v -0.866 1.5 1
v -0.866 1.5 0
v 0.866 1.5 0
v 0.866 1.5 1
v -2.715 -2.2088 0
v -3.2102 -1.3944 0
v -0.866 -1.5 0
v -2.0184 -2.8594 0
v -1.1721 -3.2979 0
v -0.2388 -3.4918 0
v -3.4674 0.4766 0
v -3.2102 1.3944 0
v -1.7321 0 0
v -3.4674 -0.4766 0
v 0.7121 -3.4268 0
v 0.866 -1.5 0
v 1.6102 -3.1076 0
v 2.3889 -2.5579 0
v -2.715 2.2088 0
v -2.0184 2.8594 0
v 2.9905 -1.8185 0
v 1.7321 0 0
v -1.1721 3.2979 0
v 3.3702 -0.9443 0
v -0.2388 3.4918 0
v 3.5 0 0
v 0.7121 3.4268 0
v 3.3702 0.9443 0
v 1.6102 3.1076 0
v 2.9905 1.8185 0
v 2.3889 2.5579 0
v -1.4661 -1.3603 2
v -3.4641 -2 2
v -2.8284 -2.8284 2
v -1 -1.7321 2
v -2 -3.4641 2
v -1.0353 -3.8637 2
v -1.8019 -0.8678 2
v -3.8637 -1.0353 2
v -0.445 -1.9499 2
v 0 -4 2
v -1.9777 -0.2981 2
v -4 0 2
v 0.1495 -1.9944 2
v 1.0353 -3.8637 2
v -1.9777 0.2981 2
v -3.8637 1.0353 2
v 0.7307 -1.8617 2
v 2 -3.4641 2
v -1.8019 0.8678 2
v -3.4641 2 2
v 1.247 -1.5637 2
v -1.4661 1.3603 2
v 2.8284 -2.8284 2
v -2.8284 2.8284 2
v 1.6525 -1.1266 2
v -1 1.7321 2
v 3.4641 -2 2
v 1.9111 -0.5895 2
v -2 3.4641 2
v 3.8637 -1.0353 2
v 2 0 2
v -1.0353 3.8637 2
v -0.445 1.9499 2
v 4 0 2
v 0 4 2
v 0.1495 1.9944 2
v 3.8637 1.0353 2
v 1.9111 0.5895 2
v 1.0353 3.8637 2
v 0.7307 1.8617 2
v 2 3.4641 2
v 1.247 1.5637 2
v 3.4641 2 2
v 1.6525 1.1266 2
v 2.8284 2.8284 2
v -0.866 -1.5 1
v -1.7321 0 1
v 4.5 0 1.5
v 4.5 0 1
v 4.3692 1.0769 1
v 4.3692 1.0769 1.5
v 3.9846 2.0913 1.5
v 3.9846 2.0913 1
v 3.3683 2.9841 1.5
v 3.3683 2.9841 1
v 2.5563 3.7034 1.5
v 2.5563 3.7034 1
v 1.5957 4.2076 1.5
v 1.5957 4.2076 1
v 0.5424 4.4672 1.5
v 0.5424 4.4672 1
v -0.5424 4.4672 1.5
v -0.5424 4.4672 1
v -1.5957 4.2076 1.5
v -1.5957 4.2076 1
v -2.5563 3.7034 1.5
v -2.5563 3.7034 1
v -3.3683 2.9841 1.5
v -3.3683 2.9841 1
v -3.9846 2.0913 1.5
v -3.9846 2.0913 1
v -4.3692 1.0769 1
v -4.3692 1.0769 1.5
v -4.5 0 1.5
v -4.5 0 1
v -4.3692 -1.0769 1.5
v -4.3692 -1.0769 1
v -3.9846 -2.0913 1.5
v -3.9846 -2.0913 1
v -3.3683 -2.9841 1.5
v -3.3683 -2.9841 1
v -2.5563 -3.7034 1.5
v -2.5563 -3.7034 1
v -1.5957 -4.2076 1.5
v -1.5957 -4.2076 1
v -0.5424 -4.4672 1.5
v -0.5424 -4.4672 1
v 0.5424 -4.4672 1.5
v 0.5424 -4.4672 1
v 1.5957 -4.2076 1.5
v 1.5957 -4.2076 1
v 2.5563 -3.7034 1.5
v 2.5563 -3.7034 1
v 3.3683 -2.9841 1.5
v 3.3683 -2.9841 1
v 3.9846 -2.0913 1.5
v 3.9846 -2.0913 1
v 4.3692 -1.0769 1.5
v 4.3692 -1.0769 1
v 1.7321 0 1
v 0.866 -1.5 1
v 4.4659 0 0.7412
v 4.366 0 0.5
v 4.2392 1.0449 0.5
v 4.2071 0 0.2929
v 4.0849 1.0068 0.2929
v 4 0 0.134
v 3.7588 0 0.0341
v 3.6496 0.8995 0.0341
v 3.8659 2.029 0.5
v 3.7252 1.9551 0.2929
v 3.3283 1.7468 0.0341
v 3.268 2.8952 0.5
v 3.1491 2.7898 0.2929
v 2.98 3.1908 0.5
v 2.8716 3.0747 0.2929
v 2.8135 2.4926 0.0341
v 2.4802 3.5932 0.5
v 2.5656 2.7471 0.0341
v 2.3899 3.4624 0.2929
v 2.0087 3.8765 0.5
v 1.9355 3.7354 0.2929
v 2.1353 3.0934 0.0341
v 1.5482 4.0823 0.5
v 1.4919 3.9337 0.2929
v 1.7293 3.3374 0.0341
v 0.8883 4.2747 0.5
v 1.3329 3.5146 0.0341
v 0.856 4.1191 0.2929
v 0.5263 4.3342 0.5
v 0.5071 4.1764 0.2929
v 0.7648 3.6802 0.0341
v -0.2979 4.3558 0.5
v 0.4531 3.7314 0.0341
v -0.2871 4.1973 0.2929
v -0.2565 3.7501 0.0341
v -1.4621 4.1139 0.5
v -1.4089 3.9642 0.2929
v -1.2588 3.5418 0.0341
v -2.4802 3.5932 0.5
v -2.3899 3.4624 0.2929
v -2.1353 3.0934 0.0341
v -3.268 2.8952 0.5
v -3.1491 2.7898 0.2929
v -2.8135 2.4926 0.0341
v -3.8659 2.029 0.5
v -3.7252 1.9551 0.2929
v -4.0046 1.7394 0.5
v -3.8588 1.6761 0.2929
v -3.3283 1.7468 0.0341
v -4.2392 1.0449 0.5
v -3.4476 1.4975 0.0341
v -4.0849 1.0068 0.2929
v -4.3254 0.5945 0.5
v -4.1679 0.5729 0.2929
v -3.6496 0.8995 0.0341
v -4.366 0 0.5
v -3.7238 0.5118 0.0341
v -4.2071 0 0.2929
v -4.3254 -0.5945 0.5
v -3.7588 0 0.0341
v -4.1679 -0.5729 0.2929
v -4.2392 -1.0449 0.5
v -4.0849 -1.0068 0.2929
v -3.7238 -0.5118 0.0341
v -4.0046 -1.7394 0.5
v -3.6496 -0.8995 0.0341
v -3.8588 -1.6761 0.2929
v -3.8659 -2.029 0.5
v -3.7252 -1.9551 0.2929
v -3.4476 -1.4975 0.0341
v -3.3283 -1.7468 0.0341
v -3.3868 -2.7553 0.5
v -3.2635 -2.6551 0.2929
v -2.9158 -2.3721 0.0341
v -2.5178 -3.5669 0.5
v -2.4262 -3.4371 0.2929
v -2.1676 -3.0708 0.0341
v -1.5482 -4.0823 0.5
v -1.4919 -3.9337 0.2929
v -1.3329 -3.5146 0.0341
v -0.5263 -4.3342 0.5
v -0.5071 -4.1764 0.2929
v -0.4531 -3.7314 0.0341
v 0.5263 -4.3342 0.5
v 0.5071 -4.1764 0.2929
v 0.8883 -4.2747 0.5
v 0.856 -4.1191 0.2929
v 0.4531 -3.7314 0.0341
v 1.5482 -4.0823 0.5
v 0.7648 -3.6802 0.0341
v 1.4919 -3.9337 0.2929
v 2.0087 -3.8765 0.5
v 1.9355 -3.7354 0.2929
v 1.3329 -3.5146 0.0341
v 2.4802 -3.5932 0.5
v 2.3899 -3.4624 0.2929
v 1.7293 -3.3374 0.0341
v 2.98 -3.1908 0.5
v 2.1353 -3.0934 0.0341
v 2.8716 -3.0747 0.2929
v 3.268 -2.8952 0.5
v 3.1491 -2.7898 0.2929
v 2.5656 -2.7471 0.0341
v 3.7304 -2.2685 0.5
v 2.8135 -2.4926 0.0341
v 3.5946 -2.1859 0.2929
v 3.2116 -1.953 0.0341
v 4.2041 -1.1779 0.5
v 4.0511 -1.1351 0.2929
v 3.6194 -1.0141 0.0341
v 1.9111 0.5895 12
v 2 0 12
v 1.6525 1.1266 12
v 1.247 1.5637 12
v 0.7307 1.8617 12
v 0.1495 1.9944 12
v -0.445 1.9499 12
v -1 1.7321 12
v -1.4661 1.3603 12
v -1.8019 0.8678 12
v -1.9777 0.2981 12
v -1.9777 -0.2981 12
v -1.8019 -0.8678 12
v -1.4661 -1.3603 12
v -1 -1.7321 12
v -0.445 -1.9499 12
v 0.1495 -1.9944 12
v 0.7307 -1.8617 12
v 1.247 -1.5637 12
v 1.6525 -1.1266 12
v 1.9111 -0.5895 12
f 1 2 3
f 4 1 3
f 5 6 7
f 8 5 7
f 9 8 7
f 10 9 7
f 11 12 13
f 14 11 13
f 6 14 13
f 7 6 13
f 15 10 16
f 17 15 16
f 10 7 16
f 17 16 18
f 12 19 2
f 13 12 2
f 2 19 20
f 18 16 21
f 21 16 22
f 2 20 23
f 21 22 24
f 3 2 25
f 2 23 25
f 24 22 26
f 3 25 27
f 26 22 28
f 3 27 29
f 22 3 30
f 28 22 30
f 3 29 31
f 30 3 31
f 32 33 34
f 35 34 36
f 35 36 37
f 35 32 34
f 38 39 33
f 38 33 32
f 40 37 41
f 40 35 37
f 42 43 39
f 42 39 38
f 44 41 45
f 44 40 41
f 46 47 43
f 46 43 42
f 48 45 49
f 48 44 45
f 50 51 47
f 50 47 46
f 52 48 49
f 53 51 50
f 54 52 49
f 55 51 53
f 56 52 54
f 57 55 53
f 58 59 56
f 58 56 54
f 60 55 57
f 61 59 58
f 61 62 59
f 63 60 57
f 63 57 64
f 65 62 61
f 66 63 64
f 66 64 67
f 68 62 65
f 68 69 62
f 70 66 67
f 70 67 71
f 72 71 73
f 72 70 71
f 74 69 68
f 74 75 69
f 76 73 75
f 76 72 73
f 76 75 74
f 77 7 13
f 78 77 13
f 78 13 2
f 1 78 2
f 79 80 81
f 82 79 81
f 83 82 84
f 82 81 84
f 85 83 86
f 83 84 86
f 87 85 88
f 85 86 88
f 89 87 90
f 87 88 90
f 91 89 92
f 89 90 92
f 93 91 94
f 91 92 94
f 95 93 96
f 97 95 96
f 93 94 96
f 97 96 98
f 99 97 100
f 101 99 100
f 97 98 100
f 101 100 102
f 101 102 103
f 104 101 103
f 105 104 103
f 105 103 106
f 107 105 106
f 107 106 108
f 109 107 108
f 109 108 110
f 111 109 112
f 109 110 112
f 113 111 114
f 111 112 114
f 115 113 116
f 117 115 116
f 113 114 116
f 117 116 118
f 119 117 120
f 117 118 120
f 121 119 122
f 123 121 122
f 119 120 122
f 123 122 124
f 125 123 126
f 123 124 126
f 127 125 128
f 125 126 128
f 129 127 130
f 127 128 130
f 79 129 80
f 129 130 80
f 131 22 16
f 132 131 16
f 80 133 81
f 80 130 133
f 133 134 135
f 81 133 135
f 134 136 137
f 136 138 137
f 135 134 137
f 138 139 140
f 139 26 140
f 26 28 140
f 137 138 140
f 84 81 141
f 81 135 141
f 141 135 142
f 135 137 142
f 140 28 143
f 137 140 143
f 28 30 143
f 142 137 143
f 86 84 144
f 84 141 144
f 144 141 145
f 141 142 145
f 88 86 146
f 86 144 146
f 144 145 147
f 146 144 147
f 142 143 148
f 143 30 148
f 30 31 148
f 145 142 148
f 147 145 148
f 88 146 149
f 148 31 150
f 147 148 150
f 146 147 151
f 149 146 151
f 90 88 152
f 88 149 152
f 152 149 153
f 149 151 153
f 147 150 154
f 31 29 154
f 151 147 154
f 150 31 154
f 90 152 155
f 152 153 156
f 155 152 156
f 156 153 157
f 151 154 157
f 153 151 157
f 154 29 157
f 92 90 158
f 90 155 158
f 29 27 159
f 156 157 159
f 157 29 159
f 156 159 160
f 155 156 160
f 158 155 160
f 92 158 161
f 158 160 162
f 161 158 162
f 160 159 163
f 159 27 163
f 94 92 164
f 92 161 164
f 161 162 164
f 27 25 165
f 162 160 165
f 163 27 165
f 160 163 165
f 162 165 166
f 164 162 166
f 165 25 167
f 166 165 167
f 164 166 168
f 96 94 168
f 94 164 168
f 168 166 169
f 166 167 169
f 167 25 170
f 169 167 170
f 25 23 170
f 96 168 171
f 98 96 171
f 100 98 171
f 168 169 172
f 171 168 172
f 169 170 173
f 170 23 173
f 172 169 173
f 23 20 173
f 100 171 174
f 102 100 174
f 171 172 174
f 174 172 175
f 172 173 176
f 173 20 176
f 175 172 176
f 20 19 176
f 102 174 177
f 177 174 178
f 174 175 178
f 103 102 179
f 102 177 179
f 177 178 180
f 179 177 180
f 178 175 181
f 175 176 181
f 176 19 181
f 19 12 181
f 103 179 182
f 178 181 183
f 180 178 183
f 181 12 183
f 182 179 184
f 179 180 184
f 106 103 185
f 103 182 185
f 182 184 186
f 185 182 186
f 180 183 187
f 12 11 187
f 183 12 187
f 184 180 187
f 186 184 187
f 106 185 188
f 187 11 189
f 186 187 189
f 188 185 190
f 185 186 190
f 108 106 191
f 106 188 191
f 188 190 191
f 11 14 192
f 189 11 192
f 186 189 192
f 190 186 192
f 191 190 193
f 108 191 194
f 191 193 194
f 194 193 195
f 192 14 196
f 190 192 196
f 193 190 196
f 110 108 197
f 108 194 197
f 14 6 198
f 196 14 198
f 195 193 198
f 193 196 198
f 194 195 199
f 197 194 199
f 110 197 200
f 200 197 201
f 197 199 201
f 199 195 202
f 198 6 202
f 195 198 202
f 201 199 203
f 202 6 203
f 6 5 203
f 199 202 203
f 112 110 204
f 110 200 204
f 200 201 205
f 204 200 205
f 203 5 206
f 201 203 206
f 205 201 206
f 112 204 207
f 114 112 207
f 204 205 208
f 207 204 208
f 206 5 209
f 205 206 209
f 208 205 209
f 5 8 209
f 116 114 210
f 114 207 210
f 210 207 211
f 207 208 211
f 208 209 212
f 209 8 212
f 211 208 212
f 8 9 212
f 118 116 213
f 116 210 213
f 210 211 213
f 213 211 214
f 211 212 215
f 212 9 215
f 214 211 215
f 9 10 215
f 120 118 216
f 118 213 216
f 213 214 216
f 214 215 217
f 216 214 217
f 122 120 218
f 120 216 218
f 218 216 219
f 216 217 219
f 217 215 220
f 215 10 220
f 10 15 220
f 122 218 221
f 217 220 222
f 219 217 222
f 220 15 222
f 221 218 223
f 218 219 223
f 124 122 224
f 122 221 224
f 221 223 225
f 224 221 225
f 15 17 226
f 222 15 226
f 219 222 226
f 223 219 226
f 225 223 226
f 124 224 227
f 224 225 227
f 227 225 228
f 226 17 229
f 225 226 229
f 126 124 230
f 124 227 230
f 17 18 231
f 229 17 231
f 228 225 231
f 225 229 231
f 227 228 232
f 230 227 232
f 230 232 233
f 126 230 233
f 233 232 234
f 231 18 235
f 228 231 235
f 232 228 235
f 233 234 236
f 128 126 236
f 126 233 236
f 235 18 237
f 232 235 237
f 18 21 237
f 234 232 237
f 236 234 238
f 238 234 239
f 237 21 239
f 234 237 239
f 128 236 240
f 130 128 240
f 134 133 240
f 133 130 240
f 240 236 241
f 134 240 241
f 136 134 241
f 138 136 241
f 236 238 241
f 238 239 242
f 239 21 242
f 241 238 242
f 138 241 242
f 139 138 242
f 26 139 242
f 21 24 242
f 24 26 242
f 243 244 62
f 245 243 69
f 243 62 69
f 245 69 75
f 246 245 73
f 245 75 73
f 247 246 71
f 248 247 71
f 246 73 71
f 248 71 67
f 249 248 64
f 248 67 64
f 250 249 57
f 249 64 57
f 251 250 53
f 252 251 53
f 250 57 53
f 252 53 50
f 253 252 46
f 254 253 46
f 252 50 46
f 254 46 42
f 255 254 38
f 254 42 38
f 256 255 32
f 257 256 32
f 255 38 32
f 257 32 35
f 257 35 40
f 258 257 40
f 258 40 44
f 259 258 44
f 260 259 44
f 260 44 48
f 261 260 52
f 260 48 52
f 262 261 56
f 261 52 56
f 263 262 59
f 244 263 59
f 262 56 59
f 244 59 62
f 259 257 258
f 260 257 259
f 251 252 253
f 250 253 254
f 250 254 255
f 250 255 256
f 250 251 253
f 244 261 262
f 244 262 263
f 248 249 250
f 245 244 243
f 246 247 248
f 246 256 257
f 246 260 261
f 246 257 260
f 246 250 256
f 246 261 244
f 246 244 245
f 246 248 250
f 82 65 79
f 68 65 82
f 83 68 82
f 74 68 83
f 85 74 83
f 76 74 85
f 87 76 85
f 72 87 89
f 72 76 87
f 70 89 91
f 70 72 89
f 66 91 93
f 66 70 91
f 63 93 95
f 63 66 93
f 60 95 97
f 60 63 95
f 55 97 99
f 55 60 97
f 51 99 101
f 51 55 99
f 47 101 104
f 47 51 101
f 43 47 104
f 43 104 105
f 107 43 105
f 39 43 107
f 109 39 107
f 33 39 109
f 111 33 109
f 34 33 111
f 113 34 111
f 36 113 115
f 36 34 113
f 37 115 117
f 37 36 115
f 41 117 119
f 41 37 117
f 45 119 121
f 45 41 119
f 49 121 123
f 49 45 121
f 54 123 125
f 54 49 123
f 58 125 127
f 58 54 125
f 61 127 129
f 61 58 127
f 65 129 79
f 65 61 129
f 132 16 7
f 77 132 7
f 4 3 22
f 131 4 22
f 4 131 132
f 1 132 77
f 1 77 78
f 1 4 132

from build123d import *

# Parameters (mm, degrees)
SKETCH_1_R          = 4.5
EXTRUDE_1_DEPTH     = 2
SKETCH_2_R          = 2
EXTRUDE_2_DEPTH     = 10
FILLET_1_R          = 1
CHAMFER_1_SIZE      = 0.5
CUT_EXTRUDE_1_DEPTH = 1


with BuildPart() as part:
    # 草图1 → 凸台-拉伸1 (new body)
    with BuildSketch(Plane.XY):
        Circle(SKETCH_1_R)
    extrude(amount=EXTRUDE_1_DEPTH)

    # 草图2 → 凸台-拉伸2 (add)
    with BuildSketch(Plane.XY.offset(2)):
        Circle(SKETCH_2_R)
    extrude(amount=EXTRUDE_2_DEPTH)

    # 圆角1
    fillet_1_edges = [part.edges().sort_by_distance(p)[0] for p in [
        (-4.5, 0, 0),
    ]]
    fillet(fillet_1_edges, radius=FILLET_1_R)

    # 倒角1
    chamfer_1_edges = [part.edges().sort_by_distance(p)[0] for p in [
        (-4.5, 0, 2),
    ]]
    chamfer(chamfer_1_edges, length=CHAMFER_1_SIZE)

    # 草图3 → 切除-拉伸1 (cut)
    with BuildSketch(Plane(origin=(0, 0, 0), x_dir=(-1, 0, 0), z_dir=(0, 0, -1))):
        Polygon((-0.866025404, 1.5), (-1.732050808, 0), (-0.866025404, -1.5), (0.866025404, -1.5), (1.732050808, 0), (0.866025404, 1.5), align=None)
    extrude(amount=-CUT_EXTRUDE_1_DEPTH, mode=Mode.SUBTRACT)


solid = part.part
